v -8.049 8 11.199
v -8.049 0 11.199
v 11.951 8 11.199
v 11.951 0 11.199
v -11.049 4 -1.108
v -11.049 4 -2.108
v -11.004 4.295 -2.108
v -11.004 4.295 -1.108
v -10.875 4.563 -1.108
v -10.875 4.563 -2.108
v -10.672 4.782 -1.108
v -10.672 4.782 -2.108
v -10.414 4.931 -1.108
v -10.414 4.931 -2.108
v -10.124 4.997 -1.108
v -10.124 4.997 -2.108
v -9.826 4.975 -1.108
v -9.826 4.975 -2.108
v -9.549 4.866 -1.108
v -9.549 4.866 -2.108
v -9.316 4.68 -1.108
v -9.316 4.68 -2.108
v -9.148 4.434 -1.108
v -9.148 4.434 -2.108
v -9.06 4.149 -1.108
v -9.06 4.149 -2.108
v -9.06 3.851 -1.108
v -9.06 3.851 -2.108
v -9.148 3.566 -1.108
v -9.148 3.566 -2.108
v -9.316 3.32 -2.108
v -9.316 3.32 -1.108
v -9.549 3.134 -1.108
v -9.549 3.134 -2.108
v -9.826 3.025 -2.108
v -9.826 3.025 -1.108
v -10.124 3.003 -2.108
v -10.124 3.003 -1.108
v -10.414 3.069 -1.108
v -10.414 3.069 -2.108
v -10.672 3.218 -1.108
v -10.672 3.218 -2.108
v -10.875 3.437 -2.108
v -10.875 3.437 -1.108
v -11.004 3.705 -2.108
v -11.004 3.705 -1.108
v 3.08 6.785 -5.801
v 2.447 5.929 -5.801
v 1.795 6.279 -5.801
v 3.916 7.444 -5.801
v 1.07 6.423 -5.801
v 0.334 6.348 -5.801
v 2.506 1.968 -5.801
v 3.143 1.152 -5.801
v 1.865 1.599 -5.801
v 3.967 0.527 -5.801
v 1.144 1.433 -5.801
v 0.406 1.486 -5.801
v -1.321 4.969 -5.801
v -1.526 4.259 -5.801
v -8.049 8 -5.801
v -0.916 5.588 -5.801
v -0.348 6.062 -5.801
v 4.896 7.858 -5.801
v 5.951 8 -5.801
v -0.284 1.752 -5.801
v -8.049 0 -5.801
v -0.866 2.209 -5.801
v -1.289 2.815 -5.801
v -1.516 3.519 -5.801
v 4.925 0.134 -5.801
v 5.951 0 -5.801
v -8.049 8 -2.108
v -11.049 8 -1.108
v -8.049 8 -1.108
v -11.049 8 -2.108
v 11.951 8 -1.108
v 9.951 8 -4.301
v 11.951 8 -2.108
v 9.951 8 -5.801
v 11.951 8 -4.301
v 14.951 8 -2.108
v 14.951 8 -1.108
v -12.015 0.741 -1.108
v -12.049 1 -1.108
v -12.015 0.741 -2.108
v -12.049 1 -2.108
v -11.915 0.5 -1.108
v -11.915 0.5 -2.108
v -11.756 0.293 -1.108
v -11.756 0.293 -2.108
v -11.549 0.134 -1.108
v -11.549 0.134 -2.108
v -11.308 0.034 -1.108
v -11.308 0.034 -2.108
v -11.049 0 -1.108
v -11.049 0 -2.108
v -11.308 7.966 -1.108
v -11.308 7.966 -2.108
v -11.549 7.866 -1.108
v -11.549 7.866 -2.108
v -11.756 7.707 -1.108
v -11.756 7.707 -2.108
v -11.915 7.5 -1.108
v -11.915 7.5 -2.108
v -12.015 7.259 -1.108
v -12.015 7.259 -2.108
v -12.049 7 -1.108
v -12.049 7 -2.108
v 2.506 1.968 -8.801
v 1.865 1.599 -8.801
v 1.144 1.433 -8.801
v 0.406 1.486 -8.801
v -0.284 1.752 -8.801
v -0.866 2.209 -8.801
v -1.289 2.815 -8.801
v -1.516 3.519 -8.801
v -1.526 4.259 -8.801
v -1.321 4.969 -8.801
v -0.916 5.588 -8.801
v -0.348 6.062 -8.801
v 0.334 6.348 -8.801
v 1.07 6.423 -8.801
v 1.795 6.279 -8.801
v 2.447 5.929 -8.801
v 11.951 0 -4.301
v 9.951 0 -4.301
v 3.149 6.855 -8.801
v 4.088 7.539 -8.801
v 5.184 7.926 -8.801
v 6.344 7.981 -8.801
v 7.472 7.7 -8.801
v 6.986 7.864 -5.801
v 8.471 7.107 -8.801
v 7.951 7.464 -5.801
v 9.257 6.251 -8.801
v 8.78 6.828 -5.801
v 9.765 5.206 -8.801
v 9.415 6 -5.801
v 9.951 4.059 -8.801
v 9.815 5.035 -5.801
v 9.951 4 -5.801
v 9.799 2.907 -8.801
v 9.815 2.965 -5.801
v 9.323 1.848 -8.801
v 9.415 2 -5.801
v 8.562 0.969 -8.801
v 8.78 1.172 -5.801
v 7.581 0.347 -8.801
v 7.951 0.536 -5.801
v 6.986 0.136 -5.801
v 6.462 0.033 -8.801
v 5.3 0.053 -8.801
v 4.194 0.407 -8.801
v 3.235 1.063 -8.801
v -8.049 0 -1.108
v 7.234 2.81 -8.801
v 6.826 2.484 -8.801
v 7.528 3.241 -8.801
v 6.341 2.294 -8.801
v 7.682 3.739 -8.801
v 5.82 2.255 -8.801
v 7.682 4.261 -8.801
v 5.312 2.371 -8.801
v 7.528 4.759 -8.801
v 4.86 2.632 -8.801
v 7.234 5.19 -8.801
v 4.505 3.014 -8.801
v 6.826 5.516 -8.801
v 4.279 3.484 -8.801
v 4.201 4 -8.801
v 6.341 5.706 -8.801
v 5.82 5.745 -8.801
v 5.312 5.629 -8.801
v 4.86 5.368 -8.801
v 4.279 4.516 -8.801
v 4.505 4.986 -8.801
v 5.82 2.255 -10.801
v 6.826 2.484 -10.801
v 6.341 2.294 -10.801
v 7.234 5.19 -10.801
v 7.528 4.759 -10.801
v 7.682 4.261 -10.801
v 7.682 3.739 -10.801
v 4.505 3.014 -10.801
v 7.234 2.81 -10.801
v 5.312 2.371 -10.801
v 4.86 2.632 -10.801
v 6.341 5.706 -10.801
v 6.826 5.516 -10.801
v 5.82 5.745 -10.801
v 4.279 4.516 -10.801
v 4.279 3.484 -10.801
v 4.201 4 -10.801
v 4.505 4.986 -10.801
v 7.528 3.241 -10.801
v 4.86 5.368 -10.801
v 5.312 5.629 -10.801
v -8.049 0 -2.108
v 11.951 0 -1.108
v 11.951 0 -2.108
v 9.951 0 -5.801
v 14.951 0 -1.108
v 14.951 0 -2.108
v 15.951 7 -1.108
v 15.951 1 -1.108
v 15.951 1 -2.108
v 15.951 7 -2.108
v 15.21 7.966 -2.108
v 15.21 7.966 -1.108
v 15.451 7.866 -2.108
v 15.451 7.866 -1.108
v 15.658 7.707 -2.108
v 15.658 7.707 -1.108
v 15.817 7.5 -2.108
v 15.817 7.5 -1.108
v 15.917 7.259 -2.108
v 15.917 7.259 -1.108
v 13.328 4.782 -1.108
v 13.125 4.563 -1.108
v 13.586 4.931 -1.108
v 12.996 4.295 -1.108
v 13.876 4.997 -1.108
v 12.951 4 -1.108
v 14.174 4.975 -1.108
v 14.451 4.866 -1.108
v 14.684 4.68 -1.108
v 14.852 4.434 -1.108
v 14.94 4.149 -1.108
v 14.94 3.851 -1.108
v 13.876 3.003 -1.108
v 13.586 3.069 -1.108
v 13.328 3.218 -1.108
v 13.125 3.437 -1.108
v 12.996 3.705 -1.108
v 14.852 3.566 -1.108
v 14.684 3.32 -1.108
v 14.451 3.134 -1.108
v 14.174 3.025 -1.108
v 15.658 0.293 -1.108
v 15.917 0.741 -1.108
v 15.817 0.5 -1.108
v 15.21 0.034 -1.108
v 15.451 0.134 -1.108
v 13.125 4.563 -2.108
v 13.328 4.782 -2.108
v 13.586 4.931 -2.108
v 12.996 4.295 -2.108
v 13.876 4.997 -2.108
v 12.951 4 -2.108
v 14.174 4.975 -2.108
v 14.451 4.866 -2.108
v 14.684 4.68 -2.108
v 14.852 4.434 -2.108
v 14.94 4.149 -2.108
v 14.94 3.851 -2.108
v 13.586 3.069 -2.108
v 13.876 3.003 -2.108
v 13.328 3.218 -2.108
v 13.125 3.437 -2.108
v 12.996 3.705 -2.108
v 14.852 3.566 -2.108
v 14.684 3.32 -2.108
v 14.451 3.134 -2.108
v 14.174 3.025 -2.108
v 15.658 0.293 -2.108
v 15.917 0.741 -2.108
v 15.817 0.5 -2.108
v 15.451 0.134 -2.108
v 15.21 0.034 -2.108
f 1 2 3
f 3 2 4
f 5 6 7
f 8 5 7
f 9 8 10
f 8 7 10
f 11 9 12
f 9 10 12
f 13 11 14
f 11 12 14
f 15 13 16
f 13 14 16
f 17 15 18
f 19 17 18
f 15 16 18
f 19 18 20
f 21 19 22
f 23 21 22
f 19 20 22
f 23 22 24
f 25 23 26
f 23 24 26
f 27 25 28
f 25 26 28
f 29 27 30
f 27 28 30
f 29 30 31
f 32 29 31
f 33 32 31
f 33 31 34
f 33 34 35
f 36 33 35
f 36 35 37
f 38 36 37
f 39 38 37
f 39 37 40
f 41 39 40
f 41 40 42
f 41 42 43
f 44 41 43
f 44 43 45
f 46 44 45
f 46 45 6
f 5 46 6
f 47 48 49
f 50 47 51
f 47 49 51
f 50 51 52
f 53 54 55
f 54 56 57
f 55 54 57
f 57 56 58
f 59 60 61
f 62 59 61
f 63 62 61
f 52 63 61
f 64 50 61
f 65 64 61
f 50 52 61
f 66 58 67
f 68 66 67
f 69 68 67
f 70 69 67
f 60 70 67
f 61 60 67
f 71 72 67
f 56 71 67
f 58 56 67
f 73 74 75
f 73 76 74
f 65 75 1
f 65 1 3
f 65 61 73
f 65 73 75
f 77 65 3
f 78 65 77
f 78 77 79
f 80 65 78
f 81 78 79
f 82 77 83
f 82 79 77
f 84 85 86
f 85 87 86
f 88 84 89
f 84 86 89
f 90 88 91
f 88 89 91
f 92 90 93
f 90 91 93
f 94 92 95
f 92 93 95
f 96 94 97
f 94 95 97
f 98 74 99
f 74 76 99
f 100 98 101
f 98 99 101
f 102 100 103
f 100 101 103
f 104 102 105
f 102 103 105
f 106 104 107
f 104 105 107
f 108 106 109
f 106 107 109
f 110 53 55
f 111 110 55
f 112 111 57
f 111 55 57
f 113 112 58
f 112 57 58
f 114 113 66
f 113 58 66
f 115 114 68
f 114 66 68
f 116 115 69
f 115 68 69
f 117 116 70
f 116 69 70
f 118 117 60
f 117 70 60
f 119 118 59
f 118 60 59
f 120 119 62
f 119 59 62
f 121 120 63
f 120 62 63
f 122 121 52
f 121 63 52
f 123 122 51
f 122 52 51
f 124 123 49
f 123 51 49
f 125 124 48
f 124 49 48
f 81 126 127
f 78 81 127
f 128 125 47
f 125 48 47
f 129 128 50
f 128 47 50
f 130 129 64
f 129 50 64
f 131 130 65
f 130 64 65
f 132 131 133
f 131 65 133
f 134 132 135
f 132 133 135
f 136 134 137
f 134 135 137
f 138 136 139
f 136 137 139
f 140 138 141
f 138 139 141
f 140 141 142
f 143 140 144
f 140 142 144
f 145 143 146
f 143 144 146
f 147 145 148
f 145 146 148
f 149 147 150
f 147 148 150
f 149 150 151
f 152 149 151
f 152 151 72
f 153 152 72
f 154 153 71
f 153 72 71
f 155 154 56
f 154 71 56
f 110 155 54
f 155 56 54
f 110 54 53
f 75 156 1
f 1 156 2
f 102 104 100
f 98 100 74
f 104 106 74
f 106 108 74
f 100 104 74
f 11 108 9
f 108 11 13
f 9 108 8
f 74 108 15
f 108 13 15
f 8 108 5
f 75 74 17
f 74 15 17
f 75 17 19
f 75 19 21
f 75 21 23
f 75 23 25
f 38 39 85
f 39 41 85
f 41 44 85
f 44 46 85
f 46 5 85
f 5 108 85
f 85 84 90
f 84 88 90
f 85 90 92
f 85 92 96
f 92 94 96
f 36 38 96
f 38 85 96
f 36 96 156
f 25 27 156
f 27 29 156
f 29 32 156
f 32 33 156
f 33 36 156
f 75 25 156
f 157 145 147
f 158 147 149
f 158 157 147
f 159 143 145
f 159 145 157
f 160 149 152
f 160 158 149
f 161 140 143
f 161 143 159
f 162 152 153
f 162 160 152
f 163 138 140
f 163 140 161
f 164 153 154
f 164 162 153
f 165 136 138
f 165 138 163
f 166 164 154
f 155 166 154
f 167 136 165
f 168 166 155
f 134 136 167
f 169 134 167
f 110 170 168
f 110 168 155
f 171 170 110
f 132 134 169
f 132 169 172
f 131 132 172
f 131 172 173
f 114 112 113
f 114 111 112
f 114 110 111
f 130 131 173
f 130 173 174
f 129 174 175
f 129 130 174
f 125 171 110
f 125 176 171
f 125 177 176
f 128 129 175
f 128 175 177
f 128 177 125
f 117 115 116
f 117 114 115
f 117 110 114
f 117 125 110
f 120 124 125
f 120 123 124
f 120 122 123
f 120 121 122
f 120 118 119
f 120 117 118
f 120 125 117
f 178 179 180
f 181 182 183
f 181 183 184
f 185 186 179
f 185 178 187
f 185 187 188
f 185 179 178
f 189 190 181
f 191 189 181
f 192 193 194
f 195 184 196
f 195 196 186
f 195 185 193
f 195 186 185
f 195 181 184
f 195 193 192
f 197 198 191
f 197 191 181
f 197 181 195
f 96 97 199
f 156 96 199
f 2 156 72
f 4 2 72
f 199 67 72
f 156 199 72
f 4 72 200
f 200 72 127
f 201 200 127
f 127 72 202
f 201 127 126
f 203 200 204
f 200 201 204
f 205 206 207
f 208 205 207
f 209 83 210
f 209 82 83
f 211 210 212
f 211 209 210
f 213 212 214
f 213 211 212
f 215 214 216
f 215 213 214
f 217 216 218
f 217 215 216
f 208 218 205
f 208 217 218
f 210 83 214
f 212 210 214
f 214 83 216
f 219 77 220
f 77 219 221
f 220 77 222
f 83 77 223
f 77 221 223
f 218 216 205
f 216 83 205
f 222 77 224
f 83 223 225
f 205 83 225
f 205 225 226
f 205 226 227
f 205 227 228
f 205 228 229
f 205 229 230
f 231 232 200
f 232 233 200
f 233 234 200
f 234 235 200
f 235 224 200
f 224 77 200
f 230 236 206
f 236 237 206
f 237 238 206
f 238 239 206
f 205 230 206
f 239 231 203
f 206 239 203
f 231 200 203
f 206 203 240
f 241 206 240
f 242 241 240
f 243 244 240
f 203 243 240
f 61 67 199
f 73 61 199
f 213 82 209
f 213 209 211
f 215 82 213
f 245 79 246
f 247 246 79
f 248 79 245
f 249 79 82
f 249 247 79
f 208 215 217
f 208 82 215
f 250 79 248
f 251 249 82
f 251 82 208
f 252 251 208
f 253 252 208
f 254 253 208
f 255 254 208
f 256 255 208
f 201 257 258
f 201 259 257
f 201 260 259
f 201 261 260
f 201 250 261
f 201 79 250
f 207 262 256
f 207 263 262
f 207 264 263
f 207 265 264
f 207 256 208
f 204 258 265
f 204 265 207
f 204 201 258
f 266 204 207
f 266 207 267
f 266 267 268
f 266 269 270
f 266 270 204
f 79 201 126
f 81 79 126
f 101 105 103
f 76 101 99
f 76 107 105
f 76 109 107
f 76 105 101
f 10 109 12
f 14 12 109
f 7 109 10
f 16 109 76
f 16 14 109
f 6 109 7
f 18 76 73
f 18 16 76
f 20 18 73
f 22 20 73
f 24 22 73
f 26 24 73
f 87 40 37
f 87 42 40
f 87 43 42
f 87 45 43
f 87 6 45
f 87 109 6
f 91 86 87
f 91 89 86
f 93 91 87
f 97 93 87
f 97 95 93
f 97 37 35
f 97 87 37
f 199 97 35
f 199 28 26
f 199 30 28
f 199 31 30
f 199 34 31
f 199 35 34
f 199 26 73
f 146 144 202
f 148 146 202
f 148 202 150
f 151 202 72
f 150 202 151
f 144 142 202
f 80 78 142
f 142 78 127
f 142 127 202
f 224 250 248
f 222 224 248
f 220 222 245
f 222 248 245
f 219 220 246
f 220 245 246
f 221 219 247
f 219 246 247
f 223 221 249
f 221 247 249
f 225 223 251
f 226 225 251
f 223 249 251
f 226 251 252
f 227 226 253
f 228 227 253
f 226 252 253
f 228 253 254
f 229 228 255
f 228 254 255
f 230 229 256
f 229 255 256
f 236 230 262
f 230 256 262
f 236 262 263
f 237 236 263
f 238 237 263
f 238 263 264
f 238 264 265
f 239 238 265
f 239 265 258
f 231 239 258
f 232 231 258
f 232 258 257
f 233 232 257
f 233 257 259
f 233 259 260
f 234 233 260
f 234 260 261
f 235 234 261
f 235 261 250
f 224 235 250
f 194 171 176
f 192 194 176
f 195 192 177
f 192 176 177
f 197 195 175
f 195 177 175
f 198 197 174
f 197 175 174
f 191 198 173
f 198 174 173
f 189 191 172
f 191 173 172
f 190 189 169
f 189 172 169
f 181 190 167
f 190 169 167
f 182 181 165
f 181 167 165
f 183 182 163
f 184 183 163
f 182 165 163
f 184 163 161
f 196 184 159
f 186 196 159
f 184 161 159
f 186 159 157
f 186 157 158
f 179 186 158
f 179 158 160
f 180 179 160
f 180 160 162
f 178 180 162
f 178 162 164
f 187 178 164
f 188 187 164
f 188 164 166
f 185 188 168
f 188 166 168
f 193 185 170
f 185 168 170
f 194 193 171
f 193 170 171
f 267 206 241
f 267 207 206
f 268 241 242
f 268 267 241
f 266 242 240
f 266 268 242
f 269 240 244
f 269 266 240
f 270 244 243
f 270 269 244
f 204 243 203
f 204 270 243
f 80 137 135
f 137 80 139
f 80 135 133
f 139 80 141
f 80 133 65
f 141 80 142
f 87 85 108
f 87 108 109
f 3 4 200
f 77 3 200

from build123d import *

# Parameters (mm, degrees)
SKETCH1_W           = 4
SKETCH1_H           = 1
BOSS_EXTRUDE3_DEPTH = 8
SKETCH2_R           = 4
BOSS_EXTRUDE5_DEPTH = 3
SKETCH3_R           = 2.5
BOSS_EXTRUDE6_DEPTH = 3
SKETCH4_R           = 1
CUT_EXTRUDE1_DEPTH  = 23.259998772
FILLET2_R           = 1
FILLET3_R           = 1
SKETCH6_R           = 1.75
BOSS_EXTRUDE8_DEPTH = 2


with BuildPart() as part:
    # Sketch1 → Boss-Extrude3 (new body)
    with BuildSketch(Plane(origin=(0, 0, 0), x_dir=(1, 0, 0), z_dir=(0, 1, 0))):
        Polygon((9.951219512, 4.301393728), (9.951219512, 5.801393728), (-8.048780488, 5.801393728), (-8.048780488, -11.198606272), (11.951219512, -11.198606272), (11.951219512, 4.301393728), align=None)
        with Locations((13.951219512, 1.608013937)):
            Rectangle(SKETCH1_W, SKETCH1_H)
        with Locations((-10.048780488, 1.608013937)):
            Rectangle(SKETCH1_W, SKETCH1_H)
    extrude(amount=BOSS_EXTRUDE3_DEPTH)

    # Sketch2 → Boss-Extrude5 (add)
    with BuildSketch(Plane(origin=(0, 0, -5.801393728), x_dir=(-1, 0, 0), z_dir=(0, 0, -1))):
        with Locations(Location((-5.951219512, 4, 0), (0, 0, 180))):
            Circle(SKETCH2_R)
    extrude(amount=BOSS_EXTRUDE5_DEPTH)

    # Sketch3 → Boss-Extrude6 (add)
    with BuildSketch(Plane(origin=(0, 0, -5.801393728), x_dir=(-1, 0, 0), z_dir=(0, 0, -1))):
        with Locations((-0.951219512, 3.925831124)):
            Circle(SKETCH3_R)
    extrude(amount=BOSS_EXTRUDE6_DEPTH)

    # Sketch4 → Cut-Extrude1 (cut, through all)
    with BuildSketch(Plane(origin=(0, 0, -2.108013937), x_dir=(-1, 0, 0), z_dir=(0, 0, -1))):
        with Locations((-13.951219512, 4)):
            Circle(SKETCH4_R)
        with Locations((10.048780488, 4)):
            Circle(SKETCH4_R)
    extrude(amount=-CUT_EXTRUDE1_DEPTH, mode=Mode.SUBTRACT)

    # Fillet2
    fillet2_edges = [part.edges().sort_by_distance(p)[0] for p in [
        (15.951219512, 8, -1.608013937),
    ]]
    fillet(fillet2_edges, radius=FILLET2_R)

    # Fillet3
    fillet3_edges = [part.edges().sort_by_distance(p)[0] for p in [
        (15.951219512, 0, -1.608013937),
        (-12.048780488, 8, -1.608013937),
        (-12.048780488, 0, -1.608013937),
    ]]
    fillet(fillet3_edges, radius=FILLET3_R)

    # Sketch6 → Boss-Extrude8 (add)
    with BuildSketch(Plane(origin=(0, 0, -8.801393728), x_dir=(-1, 0, 0), z_dir=(0, 0, -1))):
        with Locations((-5.951219512, 4)):
            Circle(SKETCH6_R)
    extrude(amount=BOSS_EXTRUDE8_DEPTH)


solid = part.part
